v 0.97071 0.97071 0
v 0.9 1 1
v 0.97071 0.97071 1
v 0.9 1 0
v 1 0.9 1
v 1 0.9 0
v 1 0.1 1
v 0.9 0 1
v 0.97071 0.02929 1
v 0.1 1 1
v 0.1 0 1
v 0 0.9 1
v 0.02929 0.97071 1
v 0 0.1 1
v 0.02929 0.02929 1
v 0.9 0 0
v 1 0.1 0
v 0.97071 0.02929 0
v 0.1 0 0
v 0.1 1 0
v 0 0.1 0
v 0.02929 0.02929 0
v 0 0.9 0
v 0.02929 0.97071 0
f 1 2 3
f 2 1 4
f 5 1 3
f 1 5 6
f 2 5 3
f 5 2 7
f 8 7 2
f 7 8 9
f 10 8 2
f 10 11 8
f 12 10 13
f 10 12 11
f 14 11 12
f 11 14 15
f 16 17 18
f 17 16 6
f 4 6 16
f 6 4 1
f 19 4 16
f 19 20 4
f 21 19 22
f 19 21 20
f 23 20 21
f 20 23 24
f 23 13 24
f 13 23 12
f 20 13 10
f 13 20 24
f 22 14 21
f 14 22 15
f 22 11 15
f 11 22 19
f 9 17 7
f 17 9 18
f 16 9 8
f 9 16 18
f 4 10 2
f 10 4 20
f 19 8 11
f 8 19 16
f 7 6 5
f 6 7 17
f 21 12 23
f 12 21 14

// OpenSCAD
// use $fn % 4 = 0;
module cube_fillet(lwh=[1,1,1], r=0.1, $fn=8, center=true) {
    $fn = ceil($fn / 4) * 4;
    
    center_translation = center ? [0,0,0] : [lwh[0] * 0.5, lwh[1] * 0.5, lwh[2] * 0.5, ];
    
    translate(center_translation){
        union(){
            //corners
            //NE
            translate([lwh[0] * 0.5 - r, lwh[1] * 0.5 - r, -lwh[2]*0.5]){ 
                cylinder(h=lwh[2], r=r, $fn=$fn);
            }
            //SE
            translate([-(lwh[0] * 0.5 - r), lwh[1] * 0.5 - r, -lwh[2]*0.5]){
                cylinder(h=lwh[2], r=r, $fn=$fn);
            }
            //NE
            translate([-(lwh[0] * 0.5 - r), -(lwh[1] * 0.5 - r), -lwh[2]*0.5]){
                cylinder(h=lwh[2], r=r, $fn=$fn);
            }
            //SE
            translate([lwh[0] * 0.5 - r, -(lwh[1] * 0.5 - r), -lwh[2]*0.5]){
                cylinder(h=lwh[2], r=r, $fn=$fn);
            }
            
            // boxes
            cube([lwh[0] - 2*r, lwh[1], lwh[2]], true);
            cube([lwh[0], lwh[1] - 2*r, lwh[2]], true);
        };
    }
};

cube_fillet(center=false);
